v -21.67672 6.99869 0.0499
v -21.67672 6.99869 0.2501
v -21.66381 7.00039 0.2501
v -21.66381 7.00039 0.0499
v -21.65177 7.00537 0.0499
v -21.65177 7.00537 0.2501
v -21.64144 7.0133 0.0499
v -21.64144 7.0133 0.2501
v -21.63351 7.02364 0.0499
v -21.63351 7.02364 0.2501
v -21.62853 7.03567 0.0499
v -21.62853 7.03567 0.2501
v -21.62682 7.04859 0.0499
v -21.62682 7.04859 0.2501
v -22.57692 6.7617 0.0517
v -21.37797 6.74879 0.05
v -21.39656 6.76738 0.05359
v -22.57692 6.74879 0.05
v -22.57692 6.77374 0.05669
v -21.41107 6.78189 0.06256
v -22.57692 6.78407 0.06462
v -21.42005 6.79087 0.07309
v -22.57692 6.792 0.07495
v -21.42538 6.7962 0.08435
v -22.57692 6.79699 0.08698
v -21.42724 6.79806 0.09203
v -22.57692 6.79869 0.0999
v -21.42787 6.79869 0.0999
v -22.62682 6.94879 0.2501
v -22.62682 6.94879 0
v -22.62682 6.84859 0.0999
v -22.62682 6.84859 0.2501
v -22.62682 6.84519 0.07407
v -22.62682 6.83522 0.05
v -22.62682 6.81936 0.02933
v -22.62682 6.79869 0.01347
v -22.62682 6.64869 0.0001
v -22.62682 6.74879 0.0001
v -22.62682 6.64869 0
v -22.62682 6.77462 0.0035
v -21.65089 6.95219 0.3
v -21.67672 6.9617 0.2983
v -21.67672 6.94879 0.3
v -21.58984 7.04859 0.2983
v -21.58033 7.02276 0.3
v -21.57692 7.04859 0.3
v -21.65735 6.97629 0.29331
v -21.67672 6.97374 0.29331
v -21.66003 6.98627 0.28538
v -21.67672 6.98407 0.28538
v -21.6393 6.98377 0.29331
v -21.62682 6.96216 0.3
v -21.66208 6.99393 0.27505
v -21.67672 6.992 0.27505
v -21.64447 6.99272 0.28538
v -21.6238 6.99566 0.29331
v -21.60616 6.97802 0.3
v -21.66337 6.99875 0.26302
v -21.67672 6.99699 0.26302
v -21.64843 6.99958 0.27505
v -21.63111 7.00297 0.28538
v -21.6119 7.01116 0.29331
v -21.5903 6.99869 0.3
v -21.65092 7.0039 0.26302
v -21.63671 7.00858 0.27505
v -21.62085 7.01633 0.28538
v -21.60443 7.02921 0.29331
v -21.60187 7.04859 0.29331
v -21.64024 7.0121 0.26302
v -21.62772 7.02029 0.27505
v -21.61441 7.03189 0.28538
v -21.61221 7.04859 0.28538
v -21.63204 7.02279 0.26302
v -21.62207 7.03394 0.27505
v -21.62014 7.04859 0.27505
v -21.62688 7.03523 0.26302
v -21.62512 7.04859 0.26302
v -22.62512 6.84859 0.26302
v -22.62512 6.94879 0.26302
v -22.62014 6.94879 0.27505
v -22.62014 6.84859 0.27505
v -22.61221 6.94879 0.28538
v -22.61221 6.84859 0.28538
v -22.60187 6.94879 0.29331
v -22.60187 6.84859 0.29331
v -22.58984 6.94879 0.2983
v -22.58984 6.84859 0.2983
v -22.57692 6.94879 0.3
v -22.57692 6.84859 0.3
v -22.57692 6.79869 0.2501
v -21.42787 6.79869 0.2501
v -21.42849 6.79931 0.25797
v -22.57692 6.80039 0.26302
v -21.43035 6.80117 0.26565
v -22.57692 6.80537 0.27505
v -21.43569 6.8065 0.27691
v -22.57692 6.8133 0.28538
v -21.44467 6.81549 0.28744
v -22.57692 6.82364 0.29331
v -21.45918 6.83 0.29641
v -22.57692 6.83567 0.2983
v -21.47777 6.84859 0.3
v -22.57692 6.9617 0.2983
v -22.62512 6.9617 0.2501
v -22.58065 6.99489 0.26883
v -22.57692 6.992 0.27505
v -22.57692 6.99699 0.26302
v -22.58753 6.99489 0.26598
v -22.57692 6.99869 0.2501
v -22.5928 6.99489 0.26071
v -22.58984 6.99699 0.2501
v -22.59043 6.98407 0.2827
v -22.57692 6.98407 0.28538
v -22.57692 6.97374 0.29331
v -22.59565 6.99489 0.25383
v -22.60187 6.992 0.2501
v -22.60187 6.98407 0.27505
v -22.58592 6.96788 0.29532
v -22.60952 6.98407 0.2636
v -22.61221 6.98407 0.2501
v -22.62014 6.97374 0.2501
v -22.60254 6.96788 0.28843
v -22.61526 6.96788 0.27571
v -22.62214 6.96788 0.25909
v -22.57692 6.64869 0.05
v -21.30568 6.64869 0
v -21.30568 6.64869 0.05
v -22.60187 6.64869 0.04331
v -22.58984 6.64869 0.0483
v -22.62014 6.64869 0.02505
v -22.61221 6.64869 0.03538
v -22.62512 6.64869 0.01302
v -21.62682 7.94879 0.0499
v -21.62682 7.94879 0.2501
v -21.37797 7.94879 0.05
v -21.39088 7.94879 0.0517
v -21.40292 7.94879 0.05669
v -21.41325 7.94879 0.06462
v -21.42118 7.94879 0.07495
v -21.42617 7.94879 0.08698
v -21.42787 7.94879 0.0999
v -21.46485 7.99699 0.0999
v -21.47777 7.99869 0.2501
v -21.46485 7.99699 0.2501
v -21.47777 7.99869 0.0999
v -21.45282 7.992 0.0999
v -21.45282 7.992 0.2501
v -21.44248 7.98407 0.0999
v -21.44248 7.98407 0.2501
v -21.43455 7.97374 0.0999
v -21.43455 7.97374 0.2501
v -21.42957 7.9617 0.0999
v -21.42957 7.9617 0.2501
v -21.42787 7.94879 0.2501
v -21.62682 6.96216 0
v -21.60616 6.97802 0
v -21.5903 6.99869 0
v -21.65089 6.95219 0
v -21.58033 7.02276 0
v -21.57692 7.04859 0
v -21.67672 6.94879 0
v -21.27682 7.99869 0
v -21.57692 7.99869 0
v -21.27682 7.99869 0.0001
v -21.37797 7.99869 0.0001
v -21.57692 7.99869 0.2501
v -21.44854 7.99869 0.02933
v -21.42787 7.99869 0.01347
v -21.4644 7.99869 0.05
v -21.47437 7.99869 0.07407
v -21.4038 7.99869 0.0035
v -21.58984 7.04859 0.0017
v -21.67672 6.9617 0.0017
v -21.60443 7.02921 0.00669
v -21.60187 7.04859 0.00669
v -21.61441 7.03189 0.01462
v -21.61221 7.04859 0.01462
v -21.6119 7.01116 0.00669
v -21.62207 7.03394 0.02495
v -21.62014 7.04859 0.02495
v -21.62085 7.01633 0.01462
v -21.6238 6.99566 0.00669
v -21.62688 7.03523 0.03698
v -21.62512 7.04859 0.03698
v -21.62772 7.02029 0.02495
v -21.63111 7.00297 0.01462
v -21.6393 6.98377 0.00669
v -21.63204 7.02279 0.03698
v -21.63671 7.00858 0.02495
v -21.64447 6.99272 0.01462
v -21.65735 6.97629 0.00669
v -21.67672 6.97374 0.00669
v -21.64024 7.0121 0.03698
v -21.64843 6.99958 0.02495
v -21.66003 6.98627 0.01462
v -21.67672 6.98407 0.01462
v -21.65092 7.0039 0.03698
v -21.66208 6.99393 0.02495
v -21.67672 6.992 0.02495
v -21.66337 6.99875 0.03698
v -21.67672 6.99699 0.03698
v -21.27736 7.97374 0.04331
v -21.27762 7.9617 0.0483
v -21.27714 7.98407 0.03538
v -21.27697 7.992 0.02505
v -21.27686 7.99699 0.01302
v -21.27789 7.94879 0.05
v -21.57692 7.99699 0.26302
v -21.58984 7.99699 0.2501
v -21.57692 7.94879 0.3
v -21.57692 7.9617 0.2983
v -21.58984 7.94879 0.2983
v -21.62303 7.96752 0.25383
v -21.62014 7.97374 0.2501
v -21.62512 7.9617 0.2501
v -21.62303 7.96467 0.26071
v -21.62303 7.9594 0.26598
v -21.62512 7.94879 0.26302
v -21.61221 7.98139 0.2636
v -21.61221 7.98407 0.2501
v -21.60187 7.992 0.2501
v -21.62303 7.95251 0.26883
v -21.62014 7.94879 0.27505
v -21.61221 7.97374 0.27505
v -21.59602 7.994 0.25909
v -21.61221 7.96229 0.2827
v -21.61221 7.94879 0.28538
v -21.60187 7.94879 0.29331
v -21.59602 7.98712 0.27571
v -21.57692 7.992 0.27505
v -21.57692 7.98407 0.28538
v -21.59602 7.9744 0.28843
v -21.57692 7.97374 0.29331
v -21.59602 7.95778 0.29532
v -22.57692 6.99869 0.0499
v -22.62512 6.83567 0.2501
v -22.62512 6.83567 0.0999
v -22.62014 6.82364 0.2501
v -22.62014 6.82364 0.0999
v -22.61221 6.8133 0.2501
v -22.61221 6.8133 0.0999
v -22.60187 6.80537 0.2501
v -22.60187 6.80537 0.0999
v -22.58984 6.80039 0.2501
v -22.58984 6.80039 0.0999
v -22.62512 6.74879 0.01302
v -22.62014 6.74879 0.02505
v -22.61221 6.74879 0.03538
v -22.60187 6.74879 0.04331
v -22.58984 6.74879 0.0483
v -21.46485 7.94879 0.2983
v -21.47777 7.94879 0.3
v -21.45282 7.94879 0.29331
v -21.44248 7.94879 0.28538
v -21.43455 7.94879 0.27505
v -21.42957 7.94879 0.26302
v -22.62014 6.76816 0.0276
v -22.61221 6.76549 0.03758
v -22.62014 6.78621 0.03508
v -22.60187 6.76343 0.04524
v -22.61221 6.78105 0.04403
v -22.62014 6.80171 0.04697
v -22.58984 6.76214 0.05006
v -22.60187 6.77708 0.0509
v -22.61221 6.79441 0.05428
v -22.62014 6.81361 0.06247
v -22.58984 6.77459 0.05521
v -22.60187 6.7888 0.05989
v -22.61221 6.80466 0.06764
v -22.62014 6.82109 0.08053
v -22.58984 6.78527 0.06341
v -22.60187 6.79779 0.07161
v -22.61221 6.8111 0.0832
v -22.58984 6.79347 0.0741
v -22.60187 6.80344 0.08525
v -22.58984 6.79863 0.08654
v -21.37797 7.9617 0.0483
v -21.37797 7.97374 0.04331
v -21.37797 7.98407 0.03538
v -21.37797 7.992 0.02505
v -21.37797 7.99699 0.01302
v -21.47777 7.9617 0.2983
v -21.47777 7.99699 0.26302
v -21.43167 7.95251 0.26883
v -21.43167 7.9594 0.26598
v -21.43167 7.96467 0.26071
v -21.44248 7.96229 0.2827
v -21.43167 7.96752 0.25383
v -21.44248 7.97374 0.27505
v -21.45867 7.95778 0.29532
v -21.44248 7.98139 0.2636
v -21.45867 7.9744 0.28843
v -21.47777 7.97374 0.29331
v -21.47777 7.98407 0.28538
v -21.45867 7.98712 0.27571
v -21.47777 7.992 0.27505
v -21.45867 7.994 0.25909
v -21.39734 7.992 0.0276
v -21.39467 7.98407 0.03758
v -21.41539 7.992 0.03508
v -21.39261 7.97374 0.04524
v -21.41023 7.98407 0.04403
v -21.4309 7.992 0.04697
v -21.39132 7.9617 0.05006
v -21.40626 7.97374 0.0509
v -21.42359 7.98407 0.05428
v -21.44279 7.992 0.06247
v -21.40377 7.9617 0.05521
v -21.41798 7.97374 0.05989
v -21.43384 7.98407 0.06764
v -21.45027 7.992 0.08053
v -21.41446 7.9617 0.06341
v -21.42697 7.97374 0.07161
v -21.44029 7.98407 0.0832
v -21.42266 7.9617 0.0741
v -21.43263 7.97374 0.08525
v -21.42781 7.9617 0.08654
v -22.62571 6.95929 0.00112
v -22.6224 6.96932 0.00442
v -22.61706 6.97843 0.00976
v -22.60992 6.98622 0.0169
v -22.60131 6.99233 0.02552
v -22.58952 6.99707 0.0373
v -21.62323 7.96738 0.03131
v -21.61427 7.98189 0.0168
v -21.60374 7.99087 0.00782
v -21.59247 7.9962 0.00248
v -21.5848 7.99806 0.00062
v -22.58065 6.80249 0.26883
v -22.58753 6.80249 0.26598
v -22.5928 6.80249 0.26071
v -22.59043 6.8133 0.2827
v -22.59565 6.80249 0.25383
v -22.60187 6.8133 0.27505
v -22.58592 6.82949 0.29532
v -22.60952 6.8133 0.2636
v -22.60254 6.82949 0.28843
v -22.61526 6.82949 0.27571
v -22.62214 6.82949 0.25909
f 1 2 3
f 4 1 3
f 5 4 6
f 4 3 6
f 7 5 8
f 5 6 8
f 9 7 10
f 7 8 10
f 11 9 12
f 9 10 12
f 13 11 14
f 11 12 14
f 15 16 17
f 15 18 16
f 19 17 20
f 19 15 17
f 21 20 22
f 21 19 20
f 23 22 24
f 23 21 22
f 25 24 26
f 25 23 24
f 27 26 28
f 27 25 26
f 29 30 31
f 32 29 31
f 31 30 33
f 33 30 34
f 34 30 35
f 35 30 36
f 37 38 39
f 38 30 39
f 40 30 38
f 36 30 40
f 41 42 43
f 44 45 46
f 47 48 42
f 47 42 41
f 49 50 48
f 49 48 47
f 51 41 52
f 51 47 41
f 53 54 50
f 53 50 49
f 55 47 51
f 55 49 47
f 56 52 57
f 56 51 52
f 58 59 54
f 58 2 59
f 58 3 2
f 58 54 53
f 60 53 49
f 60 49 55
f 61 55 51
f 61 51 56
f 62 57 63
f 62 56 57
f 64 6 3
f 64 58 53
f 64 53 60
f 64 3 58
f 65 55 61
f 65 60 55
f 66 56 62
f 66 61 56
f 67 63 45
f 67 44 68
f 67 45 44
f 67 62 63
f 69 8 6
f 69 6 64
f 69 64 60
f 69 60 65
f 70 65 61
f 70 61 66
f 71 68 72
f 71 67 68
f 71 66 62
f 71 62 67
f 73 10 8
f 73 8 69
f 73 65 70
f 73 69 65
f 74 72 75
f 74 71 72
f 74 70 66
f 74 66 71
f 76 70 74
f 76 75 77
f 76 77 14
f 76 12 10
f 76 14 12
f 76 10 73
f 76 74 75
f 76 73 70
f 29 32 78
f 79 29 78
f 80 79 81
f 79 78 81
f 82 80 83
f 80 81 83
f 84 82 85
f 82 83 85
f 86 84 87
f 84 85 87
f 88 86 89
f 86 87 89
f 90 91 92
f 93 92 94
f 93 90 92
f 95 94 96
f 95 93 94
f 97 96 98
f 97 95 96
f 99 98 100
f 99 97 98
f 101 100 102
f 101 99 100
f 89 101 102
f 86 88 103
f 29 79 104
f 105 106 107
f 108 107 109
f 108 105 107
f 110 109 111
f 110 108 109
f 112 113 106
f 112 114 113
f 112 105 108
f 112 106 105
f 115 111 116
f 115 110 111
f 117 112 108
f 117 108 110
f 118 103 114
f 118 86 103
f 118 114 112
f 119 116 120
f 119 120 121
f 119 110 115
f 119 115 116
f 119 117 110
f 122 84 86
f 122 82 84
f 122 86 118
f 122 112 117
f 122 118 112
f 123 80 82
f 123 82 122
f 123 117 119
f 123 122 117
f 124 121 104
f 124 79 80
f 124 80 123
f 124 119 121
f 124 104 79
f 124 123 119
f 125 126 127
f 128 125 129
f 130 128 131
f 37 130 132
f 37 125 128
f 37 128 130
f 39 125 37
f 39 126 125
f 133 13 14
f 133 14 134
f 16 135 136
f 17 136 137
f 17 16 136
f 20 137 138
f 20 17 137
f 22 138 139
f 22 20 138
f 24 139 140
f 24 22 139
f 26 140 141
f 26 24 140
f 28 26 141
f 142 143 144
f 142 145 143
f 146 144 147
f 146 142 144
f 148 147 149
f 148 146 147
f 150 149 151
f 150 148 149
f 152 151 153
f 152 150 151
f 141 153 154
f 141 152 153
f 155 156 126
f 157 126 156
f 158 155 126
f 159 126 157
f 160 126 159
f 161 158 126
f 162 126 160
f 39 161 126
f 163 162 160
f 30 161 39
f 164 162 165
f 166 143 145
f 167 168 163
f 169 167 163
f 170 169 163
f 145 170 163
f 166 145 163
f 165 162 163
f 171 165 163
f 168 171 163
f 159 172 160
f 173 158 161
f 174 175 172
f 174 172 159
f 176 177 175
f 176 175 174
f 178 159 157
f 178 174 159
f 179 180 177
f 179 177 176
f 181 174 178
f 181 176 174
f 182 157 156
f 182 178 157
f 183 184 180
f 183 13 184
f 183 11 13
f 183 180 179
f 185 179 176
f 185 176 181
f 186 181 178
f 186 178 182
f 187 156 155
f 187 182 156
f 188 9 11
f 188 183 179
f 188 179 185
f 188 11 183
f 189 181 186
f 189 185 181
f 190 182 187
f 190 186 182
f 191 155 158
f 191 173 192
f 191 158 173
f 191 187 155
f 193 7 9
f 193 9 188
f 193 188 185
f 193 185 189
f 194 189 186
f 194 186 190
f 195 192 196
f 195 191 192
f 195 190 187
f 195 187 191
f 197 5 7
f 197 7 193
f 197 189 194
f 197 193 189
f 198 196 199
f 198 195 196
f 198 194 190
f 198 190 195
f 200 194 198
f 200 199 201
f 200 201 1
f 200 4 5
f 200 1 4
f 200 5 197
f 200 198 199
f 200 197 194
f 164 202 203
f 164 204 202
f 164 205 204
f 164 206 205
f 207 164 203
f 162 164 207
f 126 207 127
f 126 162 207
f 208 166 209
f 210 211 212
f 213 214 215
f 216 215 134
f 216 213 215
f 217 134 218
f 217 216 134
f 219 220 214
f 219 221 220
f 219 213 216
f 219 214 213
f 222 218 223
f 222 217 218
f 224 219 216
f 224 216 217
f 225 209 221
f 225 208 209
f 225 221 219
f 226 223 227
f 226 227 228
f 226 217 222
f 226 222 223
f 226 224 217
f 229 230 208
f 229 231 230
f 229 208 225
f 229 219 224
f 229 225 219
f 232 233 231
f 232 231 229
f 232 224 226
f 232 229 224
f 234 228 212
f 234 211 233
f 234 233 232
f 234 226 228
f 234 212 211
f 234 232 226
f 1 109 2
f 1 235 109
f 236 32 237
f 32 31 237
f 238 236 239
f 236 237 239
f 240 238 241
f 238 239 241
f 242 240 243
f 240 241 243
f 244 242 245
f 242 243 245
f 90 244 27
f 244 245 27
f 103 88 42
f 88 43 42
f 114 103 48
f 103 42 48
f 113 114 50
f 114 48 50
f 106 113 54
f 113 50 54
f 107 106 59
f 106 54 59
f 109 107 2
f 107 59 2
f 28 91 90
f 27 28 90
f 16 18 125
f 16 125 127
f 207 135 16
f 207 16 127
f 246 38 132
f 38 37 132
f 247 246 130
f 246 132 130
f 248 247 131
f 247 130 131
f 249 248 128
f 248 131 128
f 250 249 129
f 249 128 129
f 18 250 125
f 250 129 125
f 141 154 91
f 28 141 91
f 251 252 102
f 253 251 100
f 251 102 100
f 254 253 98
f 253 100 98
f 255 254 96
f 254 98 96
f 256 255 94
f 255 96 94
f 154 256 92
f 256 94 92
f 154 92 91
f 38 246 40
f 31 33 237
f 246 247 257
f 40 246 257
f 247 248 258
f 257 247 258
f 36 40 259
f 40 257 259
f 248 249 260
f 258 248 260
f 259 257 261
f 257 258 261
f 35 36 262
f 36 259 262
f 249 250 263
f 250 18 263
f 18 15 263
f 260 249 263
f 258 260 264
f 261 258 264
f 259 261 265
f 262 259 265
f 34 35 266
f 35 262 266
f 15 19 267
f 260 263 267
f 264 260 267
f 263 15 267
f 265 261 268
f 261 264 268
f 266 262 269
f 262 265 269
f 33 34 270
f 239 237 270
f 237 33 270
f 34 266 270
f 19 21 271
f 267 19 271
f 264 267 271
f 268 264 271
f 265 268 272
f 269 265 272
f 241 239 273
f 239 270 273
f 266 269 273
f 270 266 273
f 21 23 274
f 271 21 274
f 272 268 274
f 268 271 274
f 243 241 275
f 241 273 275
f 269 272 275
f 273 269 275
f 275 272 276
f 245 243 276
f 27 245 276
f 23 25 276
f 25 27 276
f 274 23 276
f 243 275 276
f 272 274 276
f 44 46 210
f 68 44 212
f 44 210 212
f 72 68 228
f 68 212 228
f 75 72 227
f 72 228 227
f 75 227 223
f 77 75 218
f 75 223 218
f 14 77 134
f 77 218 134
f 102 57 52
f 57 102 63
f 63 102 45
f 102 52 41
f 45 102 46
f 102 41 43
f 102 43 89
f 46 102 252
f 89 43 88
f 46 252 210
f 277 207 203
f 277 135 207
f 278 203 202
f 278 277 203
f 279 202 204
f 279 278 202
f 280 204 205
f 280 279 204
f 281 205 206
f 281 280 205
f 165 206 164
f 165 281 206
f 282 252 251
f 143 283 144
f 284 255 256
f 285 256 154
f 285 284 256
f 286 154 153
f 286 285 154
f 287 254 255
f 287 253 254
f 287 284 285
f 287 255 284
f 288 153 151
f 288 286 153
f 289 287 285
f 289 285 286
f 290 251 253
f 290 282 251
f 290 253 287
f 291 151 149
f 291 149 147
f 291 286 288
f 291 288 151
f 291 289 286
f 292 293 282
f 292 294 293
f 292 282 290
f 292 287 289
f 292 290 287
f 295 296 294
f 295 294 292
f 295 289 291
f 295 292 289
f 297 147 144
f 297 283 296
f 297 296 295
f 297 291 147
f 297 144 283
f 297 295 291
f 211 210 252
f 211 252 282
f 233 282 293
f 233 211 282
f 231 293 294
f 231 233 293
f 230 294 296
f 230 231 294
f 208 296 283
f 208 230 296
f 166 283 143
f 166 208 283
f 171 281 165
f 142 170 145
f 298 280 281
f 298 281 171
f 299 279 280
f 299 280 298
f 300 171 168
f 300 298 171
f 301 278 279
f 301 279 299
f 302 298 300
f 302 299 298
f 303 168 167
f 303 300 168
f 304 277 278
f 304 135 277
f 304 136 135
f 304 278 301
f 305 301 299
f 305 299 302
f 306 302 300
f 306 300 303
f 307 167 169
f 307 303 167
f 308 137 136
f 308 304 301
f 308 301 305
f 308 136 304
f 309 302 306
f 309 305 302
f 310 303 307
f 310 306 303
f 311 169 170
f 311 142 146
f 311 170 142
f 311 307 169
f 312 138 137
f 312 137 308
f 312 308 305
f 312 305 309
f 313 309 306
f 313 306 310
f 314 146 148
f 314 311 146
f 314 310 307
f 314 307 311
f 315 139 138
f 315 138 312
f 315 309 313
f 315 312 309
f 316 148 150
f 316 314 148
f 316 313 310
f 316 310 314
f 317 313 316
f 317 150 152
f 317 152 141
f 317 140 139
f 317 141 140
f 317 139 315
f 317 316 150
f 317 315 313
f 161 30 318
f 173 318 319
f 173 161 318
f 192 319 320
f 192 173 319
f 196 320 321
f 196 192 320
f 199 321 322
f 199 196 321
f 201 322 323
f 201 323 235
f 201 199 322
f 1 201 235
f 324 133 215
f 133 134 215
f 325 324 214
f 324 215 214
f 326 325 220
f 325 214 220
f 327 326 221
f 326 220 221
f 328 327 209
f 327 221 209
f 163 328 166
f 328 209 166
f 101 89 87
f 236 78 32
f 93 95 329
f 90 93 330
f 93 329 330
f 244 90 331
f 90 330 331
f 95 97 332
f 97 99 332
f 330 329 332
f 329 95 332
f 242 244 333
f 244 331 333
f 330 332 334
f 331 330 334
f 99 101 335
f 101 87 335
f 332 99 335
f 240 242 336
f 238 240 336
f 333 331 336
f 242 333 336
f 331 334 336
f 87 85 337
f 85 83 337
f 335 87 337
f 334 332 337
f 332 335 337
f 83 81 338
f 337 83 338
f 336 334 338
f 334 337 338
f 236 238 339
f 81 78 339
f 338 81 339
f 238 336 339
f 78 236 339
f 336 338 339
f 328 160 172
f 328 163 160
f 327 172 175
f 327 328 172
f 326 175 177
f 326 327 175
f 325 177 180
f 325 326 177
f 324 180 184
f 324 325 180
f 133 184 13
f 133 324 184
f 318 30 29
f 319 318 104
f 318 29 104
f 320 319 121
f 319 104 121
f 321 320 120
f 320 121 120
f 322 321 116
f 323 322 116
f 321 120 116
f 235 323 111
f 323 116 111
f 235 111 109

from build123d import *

# Parameters (mm, degrees)
EXTRUDE_1_DEPTH     = 0.3
CUT_EXTRUDE_1_DEPTH = 0.25
FILLET_1_R          = 0.05


with BuildPart() as part:
    # 草图1 → 凸台-拉伸1 (new body)
    with BuildSketch(Plane.XY):
        Polygon((-22.626824825, 6.798687558), (-22.626824825, 6.998687558), (-21.626824825, 6.998687558), (-21.626824825, 7.998687558), (-21.426824825, 7.998687558), (-21.426824825, 6.798687558), align=None)
        Polygon((-21.276824825, 7.998687558), (-21.30567647, 6.648687558), (-22.626824825, 6.648687558), (-22.626824825, 6.798687558), (-21.426824825, 6.798687558), (-21.426824825, 7.998687558), align=None)
    extrude(amount=EXTRUDE_1_DEPTH)

    # 草图2 → 切除-拉伸1 (cut)
    with BuildSketch(Plane.XY.offset(0.3)):
        Polygon((-21.30567647, 6.648687558), (-21.276824825, 7.998687558), (-21.427868997, 7.998687558), (-21.427868997, 6.798687558), (-21.477868997, 6.798687558), (-22.626824825, 6.798687558), (-22.626824825, 6.648687558), align=None)
    extrude(amount=-CUT_EXTRUDE_1_DEPTH, mode=Mode.SUBTRACT)

    # 圆角1
    fillet_1_edges = [part.edges().sort_by_distance(p)[0] for p in [
        (-22.626824825, 6.723687558, 0.05),
        (-21.352346911, 7.998687558, 0.05),
        (-22.626824825, 6.898687558, 0.3),
        (-22.126824825, 6.998687558, 0.3),
        (-21.527346911, 7.998687558, 0.3),
        (-21.427868997, 7.398687558, 0.3),
        (-22.027346911, 6.798687558, 0.3),
        (-21.626824825, 7.998687558, 0.15),
        (-21.626824825, 7.498687558, 0.3),
        (-21.626824825, 6.998687558, 0.15),
        (-21.626824825, 7.498687558, 0),
        (-22.626824825, 6.798687558, 0.175),
        (-22.626824825, 6.998687558, 0.15),
        (-21.427868997, 7.998687558, 0.175),
        (-22.027346911, 6.798687558, 0.05),
        (-22.126824825, 6.998687558, 0),
        (-21.427868997, 7.398687558, 0.05),
    ]]
    fillet(fillet_1_edges, radius=FILLET_1_R - 0.0001)  # a hair under: the kernel refuses the full size


solid = part.part
